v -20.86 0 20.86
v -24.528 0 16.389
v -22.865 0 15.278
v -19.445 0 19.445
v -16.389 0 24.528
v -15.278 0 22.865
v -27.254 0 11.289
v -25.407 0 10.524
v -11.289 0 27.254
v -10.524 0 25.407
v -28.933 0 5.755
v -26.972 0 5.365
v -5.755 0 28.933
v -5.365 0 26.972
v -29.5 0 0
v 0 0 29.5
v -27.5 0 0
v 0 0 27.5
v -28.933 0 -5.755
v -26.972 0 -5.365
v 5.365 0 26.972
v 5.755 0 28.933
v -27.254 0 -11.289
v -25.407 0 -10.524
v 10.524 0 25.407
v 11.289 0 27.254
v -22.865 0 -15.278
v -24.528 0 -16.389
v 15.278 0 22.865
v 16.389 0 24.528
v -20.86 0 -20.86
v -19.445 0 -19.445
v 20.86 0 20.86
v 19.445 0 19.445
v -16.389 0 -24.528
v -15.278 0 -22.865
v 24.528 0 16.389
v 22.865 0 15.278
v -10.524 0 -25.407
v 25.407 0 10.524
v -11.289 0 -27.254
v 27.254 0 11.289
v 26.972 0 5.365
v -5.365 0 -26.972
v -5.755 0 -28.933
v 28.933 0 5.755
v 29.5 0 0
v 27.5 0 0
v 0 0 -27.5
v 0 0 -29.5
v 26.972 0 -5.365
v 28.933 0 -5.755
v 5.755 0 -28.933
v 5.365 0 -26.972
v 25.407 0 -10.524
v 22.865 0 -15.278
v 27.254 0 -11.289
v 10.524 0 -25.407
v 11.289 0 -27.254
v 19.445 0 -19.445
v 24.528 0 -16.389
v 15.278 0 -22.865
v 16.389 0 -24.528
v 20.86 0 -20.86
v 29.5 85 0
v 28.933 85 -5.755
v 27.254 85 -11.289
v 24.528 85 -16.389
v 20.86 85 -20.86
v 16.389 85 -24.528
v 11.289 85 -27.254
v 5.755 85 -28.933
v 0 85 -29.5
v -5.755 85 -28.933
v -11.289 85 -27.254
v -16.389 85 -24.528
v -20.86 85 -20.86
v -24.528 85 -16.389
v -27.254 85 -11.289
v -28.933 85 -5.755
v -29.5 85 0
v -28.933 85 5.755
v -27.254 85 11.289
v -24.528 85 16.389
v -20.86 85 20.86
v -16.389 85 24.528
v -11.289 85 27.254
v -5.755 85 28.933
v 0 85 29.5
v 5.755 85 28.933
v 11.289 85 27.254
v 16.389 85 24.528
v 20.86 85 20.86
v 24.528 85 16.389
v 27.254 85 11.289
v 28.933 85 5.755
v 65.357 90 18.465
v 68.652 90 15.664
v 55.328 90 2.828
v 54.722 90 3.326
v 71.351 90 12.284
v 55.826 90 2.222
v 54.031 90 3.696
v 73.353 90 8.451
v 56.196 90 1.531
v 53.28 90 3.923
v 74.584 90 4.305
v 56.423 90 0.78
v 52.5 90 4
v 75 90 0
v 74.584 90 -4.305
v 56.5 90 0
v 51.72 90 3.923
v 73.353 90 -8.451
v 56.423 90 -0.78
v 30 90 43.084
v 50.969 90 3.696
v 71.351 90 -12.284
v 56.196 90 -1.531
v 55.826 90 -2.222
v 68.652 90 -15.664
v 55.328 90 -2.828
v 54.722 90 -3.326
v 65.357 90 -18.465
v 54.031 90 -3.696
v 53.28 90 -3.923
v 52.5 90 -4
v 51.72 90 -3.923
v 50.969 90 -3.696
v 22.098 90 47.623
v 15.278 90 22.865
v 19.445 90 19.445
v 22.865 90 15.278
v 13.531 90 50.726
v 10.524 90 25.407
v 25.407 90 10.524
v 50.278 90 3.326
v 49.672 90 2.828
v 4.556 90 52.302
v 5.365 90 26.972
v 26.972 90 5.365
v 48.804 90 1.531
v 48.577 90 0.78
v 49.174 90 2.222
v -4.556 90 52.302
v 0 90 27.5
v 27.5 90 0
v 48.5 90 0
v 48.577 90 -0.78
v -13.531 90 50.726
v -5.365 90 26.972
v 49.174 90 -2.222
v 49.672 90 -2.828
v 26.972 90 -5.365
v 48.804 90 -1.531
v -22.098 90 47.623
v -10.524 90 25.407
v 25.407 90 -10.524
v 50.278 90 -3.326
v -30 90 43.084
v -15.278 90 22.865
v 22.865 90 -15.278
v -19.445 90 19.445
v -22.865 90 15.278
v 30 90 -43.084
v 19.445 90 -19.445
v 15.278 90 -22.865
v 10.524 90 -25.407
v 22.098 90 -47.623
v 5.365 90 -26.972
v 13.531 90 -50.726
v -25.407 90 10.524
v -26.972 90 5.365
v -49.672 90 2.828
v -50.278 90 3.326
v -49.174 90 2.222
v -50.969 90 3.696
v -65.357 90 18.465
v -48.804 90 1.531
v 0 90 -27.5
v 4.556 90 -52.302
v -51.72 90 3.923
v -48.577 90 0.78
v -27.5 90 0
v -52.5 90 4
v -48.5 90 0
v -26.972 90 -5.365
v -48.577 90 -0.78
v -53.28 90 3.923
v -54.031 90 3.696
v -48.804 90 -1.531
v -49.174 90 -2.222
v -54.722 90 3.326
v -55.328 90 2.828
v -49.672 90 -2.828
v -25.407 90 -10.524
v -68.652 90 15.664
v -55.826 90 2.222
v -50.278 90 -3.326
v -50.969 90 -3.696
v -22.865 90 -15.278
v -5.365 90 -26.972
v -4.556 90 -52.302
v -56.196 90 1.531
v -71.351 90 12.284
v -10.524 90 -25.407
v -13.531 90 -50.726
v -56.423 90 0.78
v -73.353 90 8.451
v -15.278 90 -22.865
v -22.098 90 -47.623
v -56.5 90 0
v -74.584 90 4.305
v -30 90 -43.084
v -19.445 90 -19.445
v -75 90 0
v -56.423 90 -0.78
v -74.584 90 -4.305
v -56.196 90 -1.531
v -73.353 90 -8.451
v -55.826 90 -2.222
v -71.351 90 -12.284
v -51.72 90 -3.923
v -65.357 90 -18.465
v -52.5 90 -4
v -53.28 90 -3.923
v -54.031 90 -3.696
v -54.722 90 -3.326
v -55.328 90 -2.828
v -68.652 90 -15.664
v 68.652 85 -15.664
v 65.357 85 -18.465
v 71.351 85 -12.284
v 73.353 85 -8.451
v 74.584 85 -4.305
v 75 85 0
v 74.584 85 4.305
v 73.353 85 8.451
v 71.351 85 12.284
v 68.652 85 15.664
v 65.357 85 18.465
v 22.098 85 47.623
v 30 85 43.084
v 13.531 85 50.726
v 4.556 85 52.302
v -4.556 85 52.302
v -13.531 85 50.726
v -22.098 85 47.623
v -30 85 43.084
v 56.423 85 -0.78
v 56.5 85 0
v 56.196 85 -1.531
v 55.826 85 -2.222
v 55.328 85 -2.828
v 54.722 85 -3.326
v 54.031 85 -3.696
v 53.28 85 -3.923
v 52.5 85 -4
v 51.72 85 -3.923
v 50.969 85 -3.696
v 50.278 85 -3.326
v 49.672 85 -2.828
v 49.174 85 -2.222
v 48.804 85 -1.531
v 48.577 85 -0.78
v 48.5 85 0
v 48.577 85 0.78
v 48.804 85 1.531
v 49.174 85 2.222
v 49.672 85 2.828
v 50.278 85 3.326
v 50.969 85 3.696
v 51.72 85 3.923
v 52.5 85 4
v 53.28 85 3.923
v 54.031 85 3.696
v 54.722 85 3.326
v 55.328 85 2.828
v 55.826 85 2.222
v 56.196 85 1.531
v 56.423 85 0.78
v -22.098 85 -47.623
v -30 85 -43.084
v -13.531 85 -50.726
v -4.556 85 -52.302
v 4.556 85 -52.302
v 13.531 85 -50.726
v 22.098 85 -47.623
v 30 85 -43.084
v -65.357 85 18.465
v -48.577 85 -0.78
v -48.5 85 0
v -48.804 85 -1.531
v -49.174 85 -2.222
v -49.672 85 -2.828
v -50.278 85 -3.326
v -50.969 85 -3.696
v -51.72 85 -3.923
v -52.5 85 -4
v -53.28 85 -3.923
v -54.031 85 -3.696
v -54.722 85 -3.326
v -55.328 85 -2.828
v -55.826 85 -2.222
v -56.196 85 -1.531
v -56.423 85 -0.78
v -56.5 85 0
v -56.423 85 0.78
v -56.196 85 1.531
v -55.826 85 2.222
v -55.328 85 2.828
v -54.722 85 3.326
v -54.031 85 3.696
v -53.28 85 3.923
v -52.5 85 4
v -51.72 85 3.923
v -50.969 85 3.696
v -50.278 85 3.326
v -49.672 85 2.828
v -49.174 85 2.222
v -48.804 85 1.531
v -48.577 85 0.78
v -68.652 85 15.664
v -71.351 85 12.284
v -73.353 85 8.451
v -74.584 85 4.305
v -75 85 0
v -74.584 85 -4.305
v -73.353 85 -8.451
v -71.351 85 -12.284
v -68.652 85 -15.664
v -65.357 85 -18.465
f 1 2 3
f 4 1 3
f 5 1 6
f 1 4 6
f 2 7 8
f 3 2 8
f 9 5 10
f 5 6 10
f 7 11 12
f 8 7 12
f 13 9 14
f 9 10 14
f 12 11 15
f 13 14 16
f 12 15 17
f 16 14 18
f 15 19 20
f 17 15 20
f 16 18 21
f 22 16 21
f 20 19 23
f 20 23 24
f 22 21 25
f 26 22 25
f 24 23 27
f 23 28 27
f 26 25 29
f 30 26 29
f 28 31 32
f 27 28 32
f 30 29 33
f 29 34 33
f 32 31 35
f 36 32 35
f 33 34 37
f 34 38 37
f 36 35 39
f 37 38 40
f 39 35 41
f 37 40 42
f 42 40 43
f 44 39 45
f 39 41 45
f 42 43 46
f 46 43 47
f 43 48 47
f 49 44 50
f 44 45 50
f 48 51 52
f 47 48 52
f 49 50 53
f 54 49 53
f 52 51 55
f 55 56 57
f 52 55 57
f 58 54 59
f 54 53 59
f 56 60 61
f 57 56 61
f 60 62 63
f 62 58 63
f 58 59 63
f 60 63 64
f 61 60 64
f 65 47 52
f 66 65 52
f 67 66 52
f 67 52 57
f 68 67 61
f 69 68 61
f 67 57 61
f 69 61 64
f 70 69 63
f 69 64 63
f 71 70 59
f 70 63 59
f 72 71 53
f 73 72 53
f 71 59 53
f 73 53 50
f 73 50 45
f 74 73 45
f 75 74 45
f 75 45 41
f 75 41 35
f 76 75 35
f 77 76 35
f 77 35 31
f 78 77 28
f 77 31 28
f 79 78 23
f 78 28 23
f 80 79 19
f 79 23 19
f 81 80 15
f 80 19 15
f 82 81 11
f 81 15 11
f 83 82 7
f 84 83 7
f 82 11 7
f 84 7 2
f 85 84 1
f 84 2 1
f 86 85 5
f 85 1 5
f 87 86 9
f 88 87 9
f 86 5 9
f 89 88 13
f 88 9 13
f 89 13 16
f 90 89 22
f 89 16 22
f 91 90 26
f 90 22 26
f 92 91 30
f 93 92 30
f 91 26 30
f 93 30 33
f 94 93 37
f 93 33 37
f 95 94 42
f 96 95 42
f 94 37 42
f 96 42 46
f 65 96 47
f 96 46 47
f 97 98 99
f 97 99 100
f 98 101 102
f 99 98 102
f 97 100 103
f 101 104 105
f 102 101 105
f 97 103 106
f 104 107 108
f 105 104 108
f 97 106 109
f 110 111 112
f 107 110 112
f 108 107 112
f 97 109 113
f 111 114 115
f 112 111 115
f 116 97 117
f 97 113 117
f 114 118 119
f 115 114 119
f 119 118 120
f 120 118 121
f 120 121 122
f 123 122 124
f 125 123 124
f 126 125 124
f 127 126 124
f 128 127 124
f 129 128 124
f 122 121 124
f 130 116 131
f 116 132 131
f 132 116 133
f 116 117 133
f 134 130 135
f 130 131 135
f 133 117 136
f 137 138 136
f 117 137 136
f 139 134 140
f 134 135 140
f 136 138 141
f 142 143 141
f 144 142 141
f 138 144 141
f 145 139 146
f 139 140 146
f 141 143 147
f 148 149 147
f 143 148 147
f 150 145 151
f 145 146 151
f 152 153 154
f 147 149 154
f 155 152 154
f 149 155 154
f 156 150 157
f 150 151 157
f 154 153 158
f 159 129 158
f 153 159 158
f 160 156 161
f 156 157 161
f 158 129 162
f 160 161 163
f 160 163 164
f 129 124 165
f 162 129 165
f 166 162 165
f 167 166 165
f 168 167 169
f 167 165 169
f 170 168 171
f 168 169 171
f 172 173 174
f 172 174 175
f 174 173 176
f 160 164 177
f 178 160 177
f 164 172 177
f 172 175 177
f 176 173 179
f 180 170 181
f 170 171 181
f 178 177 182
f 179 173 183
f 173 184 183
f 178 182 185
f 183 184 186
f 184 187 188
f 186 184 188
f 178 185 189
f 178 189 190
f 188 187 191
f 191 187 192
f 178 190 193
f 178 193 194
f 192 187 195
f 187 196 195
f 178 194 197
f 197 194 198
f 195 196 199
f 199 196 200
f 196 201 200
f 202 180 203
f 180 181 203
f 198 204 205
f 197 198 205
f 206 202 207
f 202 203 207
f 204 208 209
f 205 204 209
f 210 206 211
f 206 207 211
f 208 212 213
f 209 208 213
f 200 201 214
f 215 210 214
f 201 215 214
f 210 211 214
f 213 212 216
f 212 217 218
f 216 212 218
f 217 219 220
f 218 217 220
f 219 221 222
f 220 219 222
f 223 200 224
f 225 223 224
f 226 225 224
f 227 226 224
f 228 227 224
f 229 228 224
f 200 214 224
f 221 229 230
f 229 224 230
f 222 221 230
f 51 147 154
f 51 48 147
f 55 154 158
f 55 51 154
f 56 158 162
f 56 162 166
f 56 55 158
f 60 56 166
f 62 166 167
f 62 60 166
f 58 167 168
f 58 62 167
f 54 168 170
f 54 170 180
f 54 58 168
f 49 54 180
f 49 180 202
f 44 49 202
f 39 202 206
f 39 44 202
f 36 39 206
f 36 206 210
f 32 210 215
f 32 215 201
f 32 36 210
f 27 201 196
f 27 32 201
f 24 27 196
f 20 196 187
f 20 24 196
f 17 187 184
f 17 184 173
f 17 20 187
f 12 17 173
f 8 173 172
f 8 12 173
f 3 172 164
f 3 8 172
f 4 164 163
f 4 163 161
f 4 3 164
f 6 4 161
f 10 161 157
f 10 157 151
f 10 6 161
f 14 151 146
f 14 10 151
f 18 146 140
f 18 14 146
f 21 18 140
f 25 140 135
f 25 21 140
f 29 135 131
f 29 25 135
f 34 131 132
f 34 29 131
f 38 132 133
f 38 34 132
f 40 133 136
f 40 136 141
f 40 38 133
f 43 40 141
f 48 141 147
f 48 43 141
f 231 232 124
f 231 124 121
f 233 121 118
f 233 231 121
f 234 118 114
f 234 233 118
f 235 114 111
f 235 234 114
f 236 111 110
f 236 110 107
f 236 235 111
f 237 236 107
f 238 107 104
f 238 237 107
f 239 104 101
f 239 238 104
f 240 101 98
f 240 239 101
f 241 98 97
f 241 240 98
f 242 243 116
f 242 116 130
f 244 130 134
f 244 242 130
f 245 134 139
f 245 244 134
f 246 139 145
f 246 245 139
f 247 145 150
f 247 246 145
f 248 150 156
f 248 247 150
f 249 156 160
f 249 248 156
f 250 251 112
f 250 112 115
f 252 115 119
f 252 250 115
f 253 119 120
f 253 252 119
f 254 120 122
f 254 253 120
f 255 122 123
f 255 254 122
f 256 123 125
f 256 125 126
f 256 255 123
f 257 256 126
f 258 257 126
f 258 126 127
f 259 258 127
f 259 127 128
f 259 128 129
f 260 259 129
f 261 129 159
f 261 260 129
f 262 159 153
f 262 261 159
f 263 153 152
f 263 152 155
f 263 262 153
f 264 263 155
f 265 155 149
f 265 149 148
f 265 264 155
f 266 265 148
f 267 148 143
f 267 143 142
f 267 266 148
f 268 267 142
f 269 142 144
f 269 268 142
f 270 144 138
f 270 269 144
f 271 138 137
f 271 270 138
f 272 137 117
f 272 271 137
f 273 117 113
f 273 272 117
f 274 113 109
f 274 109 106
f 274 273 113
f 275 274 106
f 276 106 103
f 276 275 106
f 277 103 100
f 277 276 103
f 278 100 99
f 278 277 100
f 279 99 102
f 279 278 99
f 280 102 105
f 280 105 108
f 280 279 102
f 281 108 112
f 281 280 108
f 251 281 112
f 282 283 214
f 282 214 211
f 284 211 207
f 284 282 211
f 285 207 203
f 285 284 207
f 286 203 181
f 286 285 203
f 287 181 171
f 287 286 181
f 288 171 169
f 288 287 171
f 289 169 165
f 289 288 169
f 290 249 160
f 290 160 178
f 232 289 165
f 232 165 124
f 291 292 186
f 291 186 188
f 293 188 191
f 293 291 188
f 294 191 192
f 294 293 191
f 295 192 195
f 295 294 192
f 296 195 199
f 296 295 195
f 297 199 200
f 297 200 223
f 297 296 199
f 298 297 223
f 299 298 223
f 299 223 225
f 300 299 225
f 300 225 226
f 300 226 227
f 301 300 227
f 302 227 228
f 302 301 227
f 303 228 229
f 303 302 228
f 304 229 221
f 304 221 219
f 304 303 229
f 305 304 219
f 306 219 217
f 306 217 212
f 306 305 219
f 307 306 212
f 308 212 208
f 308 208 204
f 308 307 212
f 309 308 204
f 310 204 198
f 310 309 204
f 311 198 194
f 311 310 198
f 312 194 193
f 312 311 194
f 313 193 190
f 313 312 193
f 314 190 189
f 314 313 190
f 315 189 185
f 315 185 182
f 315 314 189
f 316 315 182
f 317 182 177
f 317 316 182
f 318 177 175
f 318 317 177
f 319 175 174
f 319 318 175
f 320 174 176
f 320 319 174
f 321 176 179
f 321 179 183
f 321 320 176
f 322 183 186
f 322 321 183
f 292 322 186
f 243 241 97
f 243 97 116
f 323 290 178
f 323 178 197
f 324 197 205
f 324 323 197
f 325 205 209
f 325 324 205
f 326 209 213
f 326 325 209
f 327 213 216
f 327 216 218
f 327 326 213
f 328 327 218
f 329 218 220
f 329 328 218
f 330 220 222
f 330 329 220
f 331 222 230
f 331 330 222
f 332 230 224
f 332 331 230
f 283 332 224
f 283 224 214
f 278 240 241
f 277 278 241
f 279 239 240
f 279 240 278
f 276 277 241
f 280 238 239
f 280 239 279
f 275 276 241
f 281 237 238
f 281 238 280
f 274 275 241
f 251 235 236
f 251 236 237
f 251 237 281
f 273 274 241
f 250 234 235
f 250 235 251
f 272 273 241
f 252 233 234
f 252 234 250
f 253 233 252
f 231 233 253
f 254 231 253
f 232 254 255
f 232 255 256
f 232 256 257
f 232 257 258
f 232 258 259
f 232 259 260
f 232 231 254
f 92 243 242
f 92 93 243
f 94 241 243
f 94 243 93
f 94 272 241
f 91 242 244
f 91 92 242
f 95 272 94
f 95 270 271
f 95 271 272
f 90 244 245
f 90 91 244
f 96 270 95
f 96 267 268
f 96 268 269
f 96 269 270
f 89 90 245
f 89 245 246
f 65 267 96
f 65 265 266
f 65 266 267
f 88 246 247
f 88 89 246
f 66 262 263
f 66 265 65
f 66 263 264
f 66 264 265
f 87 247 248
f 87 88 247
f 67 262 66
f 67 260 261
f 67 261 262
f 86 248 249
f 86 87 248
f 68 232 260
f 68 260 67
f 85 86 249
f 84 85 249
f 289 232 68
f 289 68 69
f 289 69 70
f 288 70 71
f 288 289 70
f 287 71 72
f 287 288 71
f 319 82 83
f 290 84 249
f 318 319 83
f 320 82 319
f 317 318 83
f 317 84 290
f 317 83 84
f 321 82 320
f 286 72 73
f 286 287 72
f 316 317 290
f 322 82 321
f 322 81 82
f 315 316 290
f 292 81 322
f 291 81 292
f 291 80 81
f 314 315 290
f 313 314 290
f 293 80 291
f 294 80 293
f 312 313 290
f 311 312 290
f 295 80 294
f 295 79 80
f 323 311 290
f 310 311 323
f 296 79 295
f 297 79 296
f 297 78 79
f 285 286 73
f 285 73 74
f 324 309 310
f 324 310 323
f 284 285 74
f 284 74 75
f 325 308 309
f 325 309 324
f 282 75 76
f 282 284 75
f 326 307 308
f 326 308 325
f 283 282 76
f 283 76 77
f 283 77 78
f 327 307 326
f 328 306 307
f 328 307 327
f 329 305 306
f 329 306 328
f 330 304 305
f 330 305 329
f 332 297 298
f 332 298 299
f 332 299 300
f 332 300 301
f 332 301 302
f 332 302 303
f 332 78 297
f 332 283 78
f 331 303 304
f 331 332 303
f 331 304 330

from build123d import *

# Parameters (mm, degrees)
SKETCH1_R           = 29.5
SKETCH1_R_2         = 27.5
BOSS_EXTRUDE1_DEPTH = 85
SKETCH2_R           = 4
SKETCH2_R_2         = 27.5
BOSS_EXTRUDE2_DEPTH = 5


with BuildPart() as part:
    # Sketch1 → Boss-Extrude1 (new body)
    with BuildSketch(Plane(origin=(0, 0, 0), x_dir=(1, 0, 0), z_dir=(0, 1, 0))):
        Circle(SKETCH1_R)
        Circle(SKETCH1_R_2, mode=Mode.SUBTRACT)
    extrude(amount=BOSS_EXTRUDE1_DEPTH)

    # Sketch2 → Boss-Extrude2 (add)
    with BuildSketch(Plane(origin=(0, 85, 0), x_dir=(1, 0, 0), z_dir=(0, 1, 0))):
        with BuildLine():
            Line((30, 43.084219849), (65.357142857, 18.46466565))
            ThreePointArc((65.357142857, 18.46466565), (75, 0), (65.357142857, -18.46466565))
            Line((65.357142857, -18.46466565), (30, -43.084219849))
            ThreePointArc((30, -43.084219849), (0, -52.5), (-30, -43.084219849))
            Line((-30, -43.084219849), (-65.357142857, -18.46466565))
            ThreePointArc((-65.357142857, -18.46466565), (-75, 0), (-65.357142857, 18.46466565))
            Line((-65.357142857, 18.46466565), (-30, 43.084219849))
            ThreePointArc((-30, 43.084219849), (0, 52.5), (30, 43.084219849))
        make_face()
        with Locations((52.5, 0)):
            Circle(SKETCH2_R, mode=Mode.SUBTRACT)
        with Locations((-52.5, 0)):
            Circle(SKETCH2_R, mode=Mode.SUBTRACT)
        Circle(SKETCH2_R_2, mode=Mode.SUBTRACT)
    extrude(amount=BOSS_EXTRUDE2_DEPTH)


solid = part.part
